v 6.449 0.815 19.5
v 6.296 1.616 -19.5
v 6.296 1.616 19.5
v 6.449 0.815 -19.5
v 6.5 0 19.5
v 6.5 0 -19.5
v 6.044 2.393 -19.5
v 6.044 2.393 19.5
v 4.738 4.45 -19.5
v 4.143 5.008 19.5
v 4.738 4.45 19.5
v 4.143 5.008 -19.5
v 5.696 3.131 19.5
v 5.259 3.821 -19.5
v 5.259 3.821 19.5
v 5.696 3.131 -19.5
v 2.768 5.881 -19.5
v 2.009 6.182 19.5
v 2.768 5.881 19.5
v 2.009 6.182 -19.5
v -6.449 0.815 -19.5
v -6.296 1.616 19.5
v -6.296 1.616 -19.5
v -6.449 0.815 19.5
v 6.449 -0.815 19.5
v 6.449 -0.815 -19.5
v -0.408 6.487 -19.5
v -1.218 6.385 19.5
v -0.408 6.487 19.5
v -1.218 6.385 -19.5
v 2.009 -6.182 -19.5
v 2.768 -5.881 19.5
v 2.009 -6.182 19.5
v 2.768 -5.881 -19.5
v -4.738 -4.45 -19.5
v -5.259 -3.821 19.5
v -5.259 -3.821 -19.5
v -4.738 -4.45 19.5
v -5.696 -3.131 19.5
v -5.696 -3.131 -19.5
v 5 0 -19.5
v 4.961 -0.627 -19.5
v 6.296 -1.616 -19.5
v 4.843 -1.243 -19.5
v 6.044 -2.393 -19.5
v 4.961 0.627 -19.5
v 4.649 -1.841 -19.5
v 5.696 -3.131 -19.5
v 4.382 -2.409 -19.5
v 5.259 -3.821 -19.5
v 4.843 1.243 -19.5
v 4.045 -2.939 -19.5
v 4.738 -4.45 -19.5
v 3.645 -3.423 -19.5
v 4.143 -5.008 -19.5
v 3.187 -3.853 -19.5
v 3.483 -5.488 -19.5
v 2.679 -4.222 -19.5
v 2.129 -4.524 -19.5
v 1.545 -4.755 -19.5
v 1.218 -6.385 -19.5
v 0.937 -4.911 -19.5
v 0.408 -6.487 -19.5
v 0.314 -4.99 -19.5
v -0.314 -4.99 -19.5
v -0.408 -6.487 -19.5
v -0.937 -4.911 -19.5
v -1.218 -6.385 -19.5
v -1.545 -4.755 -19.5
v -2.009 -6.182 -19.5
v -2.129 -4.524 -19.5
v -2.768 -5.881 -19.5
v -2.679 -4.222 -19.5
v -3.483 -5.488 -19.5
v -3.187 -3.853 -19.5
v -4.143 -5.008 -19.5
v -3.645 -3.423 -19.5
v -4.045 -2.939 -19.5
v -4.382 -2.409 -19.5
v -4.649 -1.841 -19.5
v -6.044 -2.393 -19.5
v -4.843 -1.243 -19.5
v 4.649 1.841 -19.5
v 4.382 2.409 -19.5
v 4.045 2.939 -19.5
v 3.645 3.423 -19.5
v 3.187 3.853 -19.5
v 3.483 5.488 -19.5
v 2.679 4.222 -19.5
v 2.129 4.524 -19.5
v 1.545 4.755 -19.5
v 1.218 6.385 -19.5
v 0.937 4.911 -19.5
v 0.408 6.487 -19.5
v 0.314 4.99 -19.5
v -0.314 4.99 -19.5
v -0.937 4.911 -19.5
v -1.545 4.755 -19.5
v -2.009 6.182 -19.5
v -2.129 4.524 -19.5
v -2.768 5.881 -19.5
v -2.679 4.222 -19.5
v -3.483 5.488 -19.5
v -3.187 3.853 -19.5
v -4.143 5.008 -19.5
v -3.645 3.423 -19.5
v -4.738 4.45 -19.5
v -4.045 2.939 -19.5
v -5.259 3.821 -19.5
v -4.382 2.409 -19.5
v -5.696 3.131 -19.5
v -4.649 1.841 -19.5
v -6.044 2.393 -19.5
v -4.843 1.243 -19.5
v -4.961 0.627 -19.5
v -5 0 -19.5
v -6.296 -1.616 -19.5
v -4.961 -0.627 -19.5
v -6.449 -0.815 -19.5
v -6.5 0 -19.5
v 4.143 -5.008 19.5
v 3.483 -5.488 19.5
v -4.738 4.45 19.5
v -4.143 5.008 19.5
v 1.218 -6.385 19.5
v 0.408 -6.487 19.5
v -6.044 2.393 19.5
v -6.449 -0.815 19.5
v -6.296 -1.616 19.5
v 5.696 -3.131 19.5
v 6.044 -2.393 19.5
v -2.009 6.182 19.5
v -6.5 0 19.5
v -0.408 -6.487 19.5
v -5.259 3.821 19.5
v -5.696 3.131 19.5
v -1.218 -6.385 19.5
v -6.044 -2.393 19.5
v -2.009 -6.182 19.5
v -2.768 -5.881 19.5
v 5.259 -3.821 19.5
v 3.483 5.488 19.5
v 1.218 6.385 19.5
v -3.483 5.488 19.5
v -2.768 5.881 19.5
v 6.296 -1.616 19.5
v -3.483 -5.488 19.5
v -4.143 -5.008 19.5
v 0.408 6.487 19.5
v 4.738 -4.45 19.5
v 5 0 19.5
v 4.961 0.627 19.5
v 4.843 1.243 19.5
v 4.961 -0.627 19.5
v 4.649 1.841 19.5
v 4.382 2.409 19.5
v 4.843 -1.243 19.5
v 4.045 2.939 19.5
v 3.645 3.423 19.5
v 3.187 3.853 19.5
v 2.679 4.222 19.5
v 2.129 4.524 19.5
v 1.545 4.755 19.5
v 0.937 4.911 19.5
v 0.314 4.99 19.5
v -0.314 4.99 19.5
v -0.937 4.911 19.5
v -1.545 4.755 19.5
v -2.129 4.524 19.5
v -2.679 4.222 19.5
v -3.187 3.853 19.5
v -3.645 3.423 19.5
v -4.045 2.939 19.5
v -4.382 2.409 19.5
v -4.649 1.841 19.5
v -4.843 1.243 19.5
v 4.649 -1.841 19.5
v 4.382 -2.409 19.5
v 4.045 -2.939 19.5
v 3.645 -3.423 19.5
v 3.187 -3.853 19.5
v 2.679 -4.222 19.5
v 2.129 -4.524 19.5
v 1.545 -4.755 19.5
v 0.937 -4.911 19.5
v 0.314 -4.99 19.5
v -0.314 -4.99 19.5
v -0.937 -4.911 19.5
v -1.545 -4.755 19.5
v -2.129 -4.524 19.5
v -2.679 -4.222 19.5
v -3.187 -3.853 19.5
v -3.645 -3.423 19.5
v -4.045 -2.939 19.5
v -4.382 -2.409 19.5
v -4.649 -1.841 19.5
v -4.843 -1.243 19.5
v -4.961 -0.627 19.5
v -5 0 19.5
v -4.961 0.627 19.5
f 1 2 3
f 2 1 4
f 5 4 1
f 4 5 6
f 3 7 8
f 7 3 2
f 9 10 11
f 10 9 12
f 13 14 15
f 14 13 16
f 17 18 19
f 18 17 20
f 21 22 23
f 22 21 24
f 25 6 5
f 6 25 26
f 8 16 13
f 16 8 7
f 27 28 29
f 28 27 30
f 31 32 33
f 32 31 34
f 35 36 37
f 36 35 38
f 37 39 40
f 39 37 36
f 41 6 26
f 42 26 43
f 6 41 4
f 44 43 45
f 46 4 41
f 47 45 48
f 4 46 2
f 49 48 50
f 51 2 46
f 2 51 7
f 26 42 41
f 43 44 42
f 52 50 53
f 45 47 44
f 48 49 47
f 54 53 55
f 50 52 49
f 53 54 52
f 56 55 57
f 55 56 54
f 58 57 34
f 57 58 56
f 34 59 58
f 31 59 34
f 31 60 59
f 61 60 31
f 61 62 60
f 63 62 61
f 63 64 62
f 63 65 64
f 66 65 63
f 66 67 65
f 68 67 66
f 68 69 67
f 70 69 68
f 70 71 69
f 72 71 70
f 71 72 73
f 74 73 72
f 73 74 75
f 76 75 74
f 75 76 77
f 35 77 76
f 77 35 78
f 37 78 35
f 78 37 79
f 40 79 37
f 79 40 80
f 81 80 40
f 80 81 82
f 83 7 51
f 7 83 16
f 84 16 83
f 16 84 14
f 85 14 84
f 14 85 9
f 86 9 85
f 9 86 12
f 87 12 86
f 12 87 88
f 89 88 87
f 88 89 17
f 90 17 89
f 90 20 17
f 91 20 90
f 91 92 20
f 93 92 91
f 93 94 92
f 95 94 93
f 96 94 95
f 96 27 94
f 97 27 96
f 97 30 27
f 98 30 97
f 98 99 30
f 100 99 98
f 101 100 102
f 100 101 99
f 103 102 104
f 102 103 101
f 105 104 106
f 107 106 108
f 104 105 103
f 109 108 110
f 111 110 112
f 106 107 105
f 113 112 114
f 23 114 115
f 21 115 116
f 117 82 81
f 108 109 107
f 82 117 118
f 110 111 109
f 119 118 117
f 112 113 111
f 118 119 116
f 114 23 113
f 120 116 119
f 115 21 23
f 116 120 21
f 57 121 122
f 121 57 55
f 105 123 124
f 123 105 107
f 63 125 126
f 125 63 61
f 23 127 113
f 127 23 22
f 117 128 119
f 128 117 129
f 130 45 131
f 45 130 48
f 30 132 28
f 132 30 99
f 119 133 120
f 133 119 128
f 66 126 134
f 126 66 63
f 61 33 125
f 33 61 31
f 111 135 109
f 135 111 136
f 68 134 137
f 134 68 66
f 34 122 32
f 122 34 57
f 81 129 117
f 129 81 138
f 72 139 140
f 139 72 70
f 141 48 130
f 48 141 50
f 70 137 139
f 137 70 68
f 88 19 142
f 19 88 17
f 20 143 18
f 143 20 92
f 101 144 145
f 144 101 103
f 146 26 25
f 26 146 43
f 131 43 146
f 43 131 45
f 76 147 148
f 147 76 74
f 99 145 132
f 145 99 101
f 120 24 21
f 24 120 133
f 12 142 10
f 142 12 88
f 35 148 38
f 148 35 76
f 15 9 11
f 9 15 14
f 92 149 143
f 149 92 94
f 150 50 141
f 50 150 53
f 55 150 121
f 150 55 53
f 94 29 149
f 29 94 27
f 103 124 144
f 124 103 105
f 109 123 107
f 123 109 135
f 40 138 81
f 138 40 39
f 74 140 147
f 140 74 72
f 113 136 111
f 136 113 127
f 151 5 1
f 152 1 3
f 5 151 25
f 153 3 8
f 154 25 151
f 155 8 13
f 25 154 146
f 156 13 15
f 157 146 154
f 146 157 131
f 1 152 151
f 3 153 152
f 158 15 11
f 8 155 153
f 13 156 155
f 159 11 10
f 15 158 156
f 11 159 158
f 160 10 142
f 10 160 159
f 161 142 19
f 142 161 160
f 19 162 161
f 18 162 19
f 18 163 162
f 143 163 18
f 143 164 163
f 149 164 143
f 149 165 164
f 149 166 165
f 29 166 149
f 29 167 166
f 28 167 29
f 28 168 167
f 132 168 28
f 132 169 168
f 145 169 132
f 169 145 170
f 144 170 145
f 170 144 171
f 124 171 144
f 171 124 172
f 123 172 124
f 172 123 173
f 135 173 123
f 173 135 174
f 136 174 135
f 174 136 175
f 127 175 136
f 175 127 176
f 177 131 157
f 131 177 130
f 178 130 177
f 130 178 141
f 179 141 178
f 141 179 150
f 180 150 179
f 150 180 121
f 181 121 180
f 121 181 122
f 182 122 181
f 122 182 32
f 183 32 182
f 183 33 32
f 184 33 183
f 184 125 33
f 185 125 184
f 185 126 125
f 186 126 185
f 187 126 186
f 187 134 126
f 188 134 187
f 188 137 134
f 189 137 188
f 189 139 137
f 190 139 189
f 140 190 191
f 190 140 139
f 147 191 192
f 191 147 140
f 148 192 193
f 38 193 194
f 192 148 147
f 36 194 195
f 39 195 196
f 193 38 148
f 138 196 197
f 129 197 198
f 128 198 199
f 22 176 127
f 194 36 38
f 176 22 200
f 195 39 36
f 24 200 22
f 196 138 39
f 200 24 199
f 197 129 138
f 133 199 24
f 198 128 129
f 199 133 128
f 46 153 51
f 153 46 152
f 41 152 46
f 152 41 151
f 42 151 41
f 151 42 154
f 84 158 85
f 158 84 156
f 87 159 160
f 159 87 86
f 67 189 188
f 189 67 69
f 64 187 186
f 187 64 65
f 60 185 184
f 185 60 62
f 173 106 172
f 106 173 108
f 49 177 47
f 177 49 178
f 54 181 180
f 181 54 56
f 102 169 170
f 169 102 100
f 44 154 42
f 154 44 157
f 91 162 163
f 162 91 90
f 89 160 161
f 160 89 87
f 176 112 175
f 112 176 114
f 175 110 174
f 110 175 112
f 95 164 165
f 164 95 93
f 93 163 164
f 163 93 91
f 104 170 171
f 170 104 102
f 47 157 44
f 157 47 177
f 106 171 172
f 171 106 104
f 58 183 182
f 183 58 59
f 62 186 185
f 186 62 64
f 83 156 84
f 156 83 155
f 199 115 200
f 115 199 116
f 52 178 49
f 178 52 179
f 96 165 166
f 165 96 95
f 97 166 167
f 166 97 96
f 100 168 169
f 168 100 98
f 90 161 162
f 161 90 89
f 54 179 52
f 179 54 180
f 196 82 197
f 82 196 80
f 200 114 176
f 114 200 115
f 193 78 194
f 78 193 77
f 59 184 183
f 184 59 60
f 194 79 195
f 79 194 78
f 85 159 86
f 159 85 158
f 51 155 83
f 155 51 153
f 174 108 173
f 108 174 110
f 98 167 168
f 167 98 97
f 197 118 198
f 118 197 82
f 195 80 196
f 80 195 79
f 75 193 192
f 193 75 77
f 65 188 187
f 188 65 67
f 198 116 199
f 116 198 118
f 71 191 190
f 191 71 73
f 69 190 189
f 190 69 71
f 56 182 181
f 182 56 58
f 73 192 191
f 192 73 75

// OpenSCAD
$fn = 50;


difference() {
	union() {
		translate(v = [0, 0, -19.5000000000]) {
			cylinder(h = 39, r = 6.5000000000);
		}
	}
	union() {
		translate(v = [0, 0, -100.0000000000]) {
			cylinder(h = 200, r = 5.0000000000);
		}
	}
}
